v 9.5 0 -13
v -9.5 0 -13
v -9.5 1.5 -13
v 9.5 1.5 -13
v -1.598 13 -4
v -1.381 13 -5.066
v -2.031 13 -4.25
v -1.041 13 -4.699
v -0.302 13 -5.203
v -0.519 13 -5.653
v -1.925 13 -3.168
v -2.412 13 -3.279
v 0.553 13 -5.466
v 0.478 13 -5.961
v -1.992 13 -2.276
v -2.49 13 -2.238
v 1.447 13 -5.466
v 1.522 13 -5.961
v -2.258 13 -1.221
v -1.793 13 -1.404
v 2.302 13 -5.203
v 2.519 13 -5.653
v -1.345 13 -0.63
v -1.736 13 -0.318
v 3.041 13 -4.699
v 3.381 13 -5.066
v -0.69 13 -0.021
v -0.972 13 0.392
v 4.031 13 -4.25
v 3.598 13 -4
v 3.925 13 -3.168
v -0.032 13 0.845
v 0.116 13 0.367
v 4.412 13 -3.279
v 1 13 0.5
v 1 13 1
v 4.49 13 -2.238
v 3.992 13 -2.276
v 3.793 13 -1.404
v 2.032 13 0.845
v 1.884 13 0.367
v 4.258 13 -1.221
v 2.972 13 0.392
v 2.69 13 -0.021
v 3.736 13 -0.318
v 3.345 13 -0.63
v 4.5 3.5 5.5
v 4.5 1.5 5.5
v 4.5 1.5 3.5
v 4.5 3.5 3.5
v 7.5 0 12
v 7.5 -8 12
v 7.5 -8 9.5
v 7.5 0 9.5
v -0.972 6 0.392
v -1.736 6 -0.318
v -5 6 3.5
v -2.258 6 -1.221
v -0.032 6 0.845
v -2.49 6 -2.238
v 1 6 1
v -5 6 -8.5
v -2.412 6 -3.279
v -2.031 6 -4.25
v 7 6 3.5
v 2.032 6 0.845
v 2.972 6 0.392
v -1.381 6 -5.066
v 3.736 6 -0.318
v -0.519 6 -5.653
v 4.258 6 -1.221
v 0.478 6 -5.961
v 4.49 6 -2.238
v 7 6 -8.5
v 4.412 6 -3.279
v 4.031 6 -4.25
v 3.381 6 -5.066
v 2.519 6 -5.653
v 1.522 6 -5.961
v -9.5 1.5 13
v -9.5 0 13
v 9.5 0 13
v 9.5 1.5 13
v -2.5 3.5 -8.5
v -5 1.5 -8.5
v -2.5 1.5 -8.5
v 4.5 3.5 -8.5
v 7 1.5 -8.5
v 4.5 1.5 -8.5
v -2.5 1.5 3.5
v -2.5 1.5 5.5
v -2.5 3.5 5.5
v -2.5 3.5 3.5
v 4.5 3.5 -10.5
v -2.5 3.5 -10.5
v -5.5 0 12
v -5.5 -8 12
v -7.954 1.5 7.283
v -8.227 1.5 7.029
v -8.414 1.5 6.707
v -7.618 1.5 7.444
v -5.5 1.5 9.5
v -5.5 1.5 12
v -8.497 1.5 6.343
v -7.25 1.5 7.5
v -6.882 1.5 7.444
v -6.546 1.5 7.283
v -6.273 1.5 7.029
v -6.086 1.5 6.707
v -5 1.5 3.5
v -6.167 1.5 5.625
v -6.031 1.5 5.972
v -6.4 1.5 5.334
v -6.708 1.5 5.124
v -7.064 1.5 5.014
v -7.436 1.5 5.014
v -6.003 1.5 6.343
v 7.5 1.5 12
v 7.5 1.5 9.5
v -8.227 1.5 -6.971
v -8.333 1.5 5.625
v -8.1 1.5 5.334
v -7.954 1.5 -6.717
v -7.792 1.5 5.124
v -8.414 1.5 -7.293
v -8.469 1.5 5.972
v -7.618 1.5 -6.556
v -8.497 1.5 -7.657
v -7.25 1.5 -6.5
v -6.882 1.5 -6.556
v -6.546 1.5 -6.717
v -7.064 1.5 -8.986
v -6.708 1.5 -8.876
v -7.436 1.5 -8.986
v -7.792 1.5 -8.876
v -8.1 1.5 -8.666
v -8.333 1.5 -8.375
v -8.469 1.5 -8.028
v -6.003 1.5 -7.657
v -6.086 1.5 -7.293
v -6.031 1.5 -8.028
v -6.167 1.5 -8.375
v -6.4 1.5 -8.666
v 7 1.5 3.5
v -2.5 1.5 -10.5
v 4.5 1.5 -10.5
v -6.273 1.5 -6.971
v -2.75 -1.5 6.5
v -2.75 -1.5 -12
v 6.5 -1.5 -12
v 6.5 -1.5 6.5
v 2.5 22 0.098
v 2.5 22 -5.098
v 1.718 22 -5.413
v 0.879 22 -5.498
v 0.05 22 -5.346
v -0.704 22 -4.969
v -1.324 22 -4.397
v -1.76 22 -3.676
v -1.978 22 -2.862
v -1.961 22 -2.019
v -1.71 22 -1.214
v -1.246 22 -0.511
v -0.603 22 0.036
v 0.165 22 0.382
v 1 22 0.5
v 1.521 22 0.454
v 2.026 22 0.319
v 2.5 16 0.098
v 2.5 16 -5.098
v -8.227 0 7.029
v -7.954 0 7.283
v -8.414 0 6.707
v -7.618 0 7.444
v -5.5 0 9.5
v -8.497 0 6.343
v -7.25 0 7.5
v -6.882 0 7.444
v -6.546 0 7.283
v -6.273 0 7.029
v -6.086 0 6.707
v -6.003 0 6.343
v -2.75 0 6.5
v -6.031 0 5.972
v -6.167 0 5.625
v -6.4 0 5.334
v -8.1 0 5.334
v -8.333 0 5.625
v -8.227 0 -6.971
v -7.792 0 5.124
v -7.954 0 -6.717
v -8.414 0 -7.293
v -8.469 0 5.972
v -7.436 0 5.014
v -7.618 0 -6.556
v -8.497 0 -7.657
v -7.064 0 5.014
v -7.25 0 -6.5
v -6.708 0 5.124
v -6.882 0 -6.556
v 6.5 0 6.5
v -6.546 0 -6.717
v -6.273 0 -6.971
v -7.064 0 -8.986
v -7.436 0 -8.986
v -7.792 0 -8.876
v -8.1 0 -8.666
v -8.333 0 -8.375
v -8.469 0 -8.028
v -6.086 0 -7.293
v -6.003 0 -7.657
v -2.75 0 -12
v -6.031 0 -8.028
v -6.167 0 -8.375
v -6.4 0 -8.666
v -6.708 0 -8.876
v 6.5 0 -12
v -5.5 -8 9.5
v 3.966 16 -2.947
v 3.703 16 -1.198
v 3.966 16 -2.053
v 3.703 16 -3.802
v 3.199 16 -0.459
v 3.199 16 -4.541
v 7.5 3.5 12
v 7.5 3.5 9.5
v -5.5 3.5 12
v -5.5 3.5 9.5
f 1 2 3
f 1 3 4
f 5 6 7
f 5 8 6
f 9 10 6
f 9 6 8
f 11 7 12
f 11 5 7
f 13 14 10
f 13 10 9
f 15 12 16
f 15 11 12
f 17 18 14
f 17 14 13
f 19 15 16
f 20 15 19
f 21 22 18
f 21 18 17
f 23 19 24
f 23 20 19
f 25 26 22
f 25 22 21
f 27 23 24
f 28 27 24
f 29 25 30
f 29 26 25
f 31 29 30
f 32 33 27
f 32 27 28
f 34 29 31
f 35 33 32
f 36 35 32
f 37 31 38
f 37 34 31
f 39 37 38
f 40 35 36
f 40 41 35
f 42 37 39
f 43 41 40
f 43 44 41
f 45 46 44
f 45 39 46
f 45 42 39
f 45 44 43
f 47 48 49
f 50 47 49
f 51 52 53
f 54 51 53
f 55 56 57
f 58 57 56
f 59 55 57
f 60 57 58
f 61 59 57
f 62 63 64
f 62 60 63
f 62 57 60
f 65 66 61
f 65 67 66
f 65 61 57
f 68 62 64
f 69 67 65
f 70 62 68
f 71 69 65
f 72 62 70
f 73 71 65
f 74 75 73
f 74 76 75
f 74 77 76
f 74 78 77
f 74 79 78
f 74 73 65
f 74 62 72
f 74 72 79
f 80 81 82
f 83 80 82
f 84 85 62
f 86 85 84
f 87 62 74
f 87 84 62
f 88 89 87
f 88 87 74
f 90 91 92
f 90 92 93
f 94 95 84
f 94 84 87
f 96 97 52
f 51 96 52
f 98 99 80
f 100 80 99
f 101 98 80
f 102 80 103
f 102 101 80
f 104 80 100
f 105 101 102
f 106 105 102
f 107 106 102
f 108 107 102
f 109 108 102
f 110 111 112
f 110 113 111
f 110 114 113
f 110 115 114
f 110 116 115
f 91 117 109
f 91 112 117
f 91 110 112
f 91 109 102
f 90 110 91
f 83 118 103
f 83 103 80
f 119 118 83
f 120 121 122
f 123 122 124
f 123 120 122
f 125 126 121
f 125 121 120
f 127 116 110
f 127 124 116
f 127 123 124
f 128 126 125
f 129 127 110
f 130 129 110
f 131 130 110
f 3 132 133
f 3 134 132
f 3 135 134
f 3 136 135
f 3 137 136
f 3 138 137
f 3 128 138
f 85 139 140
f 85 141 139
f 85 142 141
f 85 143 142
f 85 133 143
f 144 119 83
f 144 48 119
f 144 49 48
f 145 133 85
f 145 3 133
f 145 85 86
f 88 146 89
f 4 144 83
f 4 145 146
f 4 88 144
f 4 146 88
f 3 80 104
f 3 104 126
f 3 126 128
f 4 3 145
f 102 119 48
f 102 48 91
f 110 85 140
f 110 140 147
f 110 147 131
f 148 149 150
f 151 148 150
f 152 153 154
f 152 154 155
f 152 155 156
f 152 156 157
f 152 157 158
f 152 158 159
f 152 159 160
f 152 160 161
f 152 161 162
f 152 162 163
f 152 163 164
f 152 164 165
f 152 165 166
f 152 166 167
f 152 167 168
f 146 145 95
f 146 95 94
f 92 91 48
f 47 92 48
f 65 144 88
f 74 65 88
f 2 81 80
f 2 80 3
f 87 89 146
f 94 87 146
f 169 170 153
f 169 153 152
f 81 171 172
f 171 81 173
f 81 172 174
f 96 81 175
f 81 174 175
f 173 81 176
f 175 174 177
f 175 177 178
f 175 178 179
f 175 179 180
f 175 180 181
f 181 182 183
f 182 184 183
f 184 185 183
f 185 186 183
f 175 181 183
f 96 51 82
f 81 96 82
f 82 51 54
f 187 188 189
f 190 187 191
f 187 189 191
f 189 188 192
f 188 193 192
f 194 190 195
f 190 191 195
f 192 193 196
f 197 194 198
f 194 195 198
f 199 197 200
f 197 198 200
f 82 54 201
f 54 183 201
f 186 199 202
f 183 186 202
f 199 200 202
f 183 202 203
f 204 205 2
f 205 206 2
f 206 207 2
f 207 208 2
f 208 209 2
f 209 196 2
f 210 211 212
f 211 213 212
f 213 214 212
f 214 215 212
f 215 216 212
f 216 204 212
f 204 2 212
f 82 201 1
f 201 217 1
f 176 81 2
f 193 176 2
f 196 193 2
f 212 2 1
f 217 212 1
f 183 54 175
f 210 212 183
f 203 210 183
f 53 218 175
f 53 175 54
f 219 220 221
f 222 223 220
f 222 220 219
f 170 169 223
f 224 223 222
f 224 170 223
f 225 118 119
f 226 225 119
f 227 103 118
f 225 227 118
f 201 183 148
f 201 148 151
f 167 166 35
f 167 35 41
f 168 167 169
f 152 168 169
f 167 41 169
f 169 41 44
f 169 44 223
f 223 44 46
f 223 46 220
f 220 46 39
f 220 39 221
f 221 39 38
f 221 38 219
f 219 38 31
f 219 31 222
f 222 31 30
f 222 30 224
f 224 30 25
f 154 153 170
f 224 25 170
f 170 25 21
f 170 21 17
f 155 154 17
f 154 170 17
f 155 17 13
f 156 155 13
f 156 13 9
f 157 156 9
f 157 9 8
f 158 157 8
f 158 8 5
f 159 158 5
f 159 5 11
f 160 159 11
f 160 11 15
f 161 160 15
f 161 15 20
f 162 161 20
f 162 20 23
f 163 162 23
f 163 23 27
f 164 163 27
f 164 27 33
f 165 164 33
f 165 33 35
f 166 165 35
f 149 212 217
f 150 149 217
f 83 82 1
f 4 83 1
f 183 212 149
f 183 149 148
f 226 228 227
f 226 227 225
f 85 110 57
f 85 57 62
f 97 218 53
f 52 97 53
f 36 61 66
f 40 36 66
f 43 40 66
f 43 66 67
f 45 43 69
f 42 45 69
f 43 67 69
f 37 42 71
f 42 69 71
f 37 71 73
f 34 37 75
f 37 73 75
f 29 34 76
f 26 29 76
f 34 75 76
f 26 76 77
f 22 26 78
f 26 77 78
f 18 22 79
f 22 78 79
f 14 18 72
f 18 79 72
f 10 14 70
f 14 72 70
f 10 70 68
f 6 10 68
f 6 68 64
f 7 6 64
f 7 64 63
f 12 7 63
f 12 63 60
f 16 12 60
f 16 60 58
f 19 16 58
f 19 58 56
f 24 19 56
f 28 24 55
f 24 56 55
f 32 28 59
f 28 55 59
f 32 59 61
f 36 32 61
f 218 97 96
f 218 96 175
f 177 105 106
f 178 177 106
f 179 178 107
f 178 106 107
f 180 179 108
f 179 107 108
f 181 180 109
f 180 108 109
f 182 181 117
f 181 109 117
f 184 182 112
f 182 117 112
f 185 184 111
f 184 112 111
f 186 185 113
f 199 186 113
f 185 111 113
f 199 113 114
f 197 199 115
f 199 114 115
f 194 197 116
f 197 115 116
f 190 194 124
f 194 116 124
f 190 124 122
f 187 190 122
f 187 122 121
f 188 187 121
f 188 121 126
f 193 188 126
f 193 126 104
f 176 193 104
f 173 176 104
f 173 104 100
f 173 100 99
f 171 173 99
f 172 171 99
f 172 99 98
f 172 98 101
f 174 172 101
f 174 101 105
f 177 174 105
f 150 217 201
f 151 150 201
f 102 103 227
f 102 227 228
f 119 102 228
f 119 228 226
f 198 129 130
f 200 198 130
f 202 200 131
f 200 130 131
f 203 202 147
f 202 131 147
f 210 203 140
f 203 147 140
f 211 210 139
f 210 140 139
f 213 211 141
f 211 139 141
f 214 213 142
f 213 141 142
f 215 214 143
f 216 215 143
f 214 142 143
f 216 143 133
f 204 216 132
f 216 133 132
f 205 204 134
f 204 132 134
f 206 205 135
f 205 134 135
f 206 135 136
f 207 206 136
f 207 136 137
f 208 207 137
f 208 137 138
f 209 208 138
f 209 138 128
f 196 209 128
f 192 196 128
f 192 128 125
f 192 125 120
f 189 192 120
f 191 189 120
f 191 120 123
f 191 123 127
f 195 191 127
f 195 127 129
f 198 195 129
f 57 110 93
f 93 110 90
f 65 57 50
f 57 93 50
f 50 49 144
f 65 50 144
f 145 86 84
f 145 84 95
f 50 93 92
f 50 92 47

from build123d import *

# Parameters (mm, degrees)
SCHIZZO1_W                        = 19
SCHIZZO1_H                        = 26
ESTRUSIONE_ESTRUSIONE1_DEPTH      = 1.5
SCHIZZO2_W                        = 12
SCHIZZO2_H                        = 12
ESTRUSIONE_ESTRUSIONE2_DEPTH      = 4.5
SCHIZZO4_R                        = 3.5
ESTRUSIONE_ESTRUSIONE3_DEPTH      = 7
SCHIZZO5_R                        = 3
ESTRUSIONE_ESTRUSIONE4_DEPTH      = 9
TAGLIO_ESTRUSIONE1_DEPTH          = 6
SCHIZZO7_R                        = 1.25
TAGLIO_ESTRUSIONE2_DEPTH          = 6
ESTRUSIONE_ESTRUSIONE5_DEPTH      = 2
ESTRUSIONE_ESTRUSIONE5_DEPTH_BACK = 9.5
SCHIZZO8_W                        = 13
SCHIZZO8_H                        = 2.5
SCHIZZO9_W                        = 9.25
SCHIZZO9_H                        = 18.5
ESTRUSIONE_ESTRUSIONE6_DEPTH      = 1.5
SCHIZZO10_W                       = 7
SCHIZZO10_H                       = 2
ESTRUSIONE_ESTRUSIONE7_DEPTH      = 2


with BuildPart() as part:
    # Schizzo1 → Estrusione-Estrusione1 (new body)
    with BuildSketch(Plane(origin=(0, 0, 0), x_dir=(1, 0, 0), z_dir=(0, 1, 0))):
        Rectangle(SCHIZZO1_W, SCHIZZO1_H)
    extrude(amount=ESTRUSIONE_ESTRUSIONE1_DEPTH)

    # Schizzo2 → Estrusione-Estrusione2 (add)
    with BuildSketch(Plane(origin=(0, 1.5, 0), x_dir=(1, 0, 0), z_dir=(0, 1, 0))):
        with Locations((1, 2.5)):
            Rectangle(SCHIZZO2_W, SCHIZZO2_H)
    extrude(amount=ESTRUSIONE_ESTRUSIONE2_DEPTH)

    # Schizzo4 → Estrusione-Estrusione3 (add)
    with BuildSketch(Plane(origin=(0, 6, 0), x_dir=(1, 0, 0), z_dir=(0, 1, 0))):
        with Locations(Location((1, 2.5, 0), (0, 0, 270))):
            Circle(SCHIZZO4_R)
    extrude(amount=ESTRUSIONE_ESTRUSIONE3_DEPTH)

    # Schizzo5 → Estrusione-Estrusione4 (add)
    with BuildSketch(Plane(origin=(0, 13, 0), x_dir=(1, 0, 0), z_dir=(0, 1, 0))):
        with Locations(Location((1, 2.5, 0), (0, 0, 270))):
            Circle(SCHIZZO5_R)
    extrude(amount=ESTRUSIONE_ESTRUSIONE4_DEPTH)

    # Schizzo6 → Taglio-Estrusione1 (cut)
    with BuildSketch(Plane(origin=(0, 22, 0), x_dir=(1, 0, 0), z_dir=(0, 1, 0))):
        Polygon((2.5, 58.528036495), (2.5, 5.098076211), (2.5, -0.098076211), (2.5, -53.528036495), (109.359920567, -53.528036495), (109.359920567, 58.528036495), align=None)
    extrude(amount=-TAGLIO_ESTRUSIONE1_DEPTH, mode=Mode.SUBTRACT)

    # Schizzo7 → Taglio-Estrusione2 (cut)
    with BuildSketch(Plane(origin=(0, 1.5, 0), x_dir=(1, 0, 0), z_dir=(0, 1, 0))):
        with Locations(Location((-7.25, 7.75, 0), (0, 0, 270))):
            Circle(SCHIZZO7_R)
        with Locations(Location((-7.25, -6.25, 0), (0, 0, 270))):
            Circle(SCHIZZO7_R)
    extrude(amount=-TAGLIO_ESTRUSIONE2_DEPTH, mode=Mode.SUBTRACT)

    # Schizzo8 → Estrusione-Estrusione5 (add, two sides: drawn at the far end of the back side and taken through both)
    with BuildSketch(Plane(origin=(0, 1.5, 0), x_dir=(1, 0, 0), z_dir=(0, 1, 0)).offset(-ESTRUSIONE_ESTRUSIONE5_DEPTH_BACK)):
        with Locations((1, -10.75)):
            Rectangle(SCHIZZO8_W, SCHIZZO8_H)
    extrude(amount=ESTRUSIONE_ESTRUSIONE5_DEPTH + ESTRUSIONE_ESTRUSIONE5_DEPTH_BACK)

    # Schizzo9 → Estrusione-Estrusione6 (add)
    with BuildSketch(Plane.XZ):
        with Locations((1.875, -2.75)):
            Rectangle(SCHIZZO9_W, SCHIZZO9_H)
    extrude(amount=ESTRUSIONE_ESTRUSIONE6_DEPTH)

    # Schizzo10 → Estrusione-Estrusione7 (add)
    with BuildSketch(Plane(origin=(0, 1.5, 0), x_dir=(1, 0, 0), z_dir=(0, 1, 0))):
        with Locations((1, 9.5)):
            Rectangle(SCHIZZO10_W, SCHIZZO10_H)
        with Locations((1, -4.5)):
            Rectangle(SCHIZZO10_W, SCHIZZO10_H)
    extrude(amount=ESTRUSIONE_ESTRUSIONE7_DEPTH)


solid = part.part
